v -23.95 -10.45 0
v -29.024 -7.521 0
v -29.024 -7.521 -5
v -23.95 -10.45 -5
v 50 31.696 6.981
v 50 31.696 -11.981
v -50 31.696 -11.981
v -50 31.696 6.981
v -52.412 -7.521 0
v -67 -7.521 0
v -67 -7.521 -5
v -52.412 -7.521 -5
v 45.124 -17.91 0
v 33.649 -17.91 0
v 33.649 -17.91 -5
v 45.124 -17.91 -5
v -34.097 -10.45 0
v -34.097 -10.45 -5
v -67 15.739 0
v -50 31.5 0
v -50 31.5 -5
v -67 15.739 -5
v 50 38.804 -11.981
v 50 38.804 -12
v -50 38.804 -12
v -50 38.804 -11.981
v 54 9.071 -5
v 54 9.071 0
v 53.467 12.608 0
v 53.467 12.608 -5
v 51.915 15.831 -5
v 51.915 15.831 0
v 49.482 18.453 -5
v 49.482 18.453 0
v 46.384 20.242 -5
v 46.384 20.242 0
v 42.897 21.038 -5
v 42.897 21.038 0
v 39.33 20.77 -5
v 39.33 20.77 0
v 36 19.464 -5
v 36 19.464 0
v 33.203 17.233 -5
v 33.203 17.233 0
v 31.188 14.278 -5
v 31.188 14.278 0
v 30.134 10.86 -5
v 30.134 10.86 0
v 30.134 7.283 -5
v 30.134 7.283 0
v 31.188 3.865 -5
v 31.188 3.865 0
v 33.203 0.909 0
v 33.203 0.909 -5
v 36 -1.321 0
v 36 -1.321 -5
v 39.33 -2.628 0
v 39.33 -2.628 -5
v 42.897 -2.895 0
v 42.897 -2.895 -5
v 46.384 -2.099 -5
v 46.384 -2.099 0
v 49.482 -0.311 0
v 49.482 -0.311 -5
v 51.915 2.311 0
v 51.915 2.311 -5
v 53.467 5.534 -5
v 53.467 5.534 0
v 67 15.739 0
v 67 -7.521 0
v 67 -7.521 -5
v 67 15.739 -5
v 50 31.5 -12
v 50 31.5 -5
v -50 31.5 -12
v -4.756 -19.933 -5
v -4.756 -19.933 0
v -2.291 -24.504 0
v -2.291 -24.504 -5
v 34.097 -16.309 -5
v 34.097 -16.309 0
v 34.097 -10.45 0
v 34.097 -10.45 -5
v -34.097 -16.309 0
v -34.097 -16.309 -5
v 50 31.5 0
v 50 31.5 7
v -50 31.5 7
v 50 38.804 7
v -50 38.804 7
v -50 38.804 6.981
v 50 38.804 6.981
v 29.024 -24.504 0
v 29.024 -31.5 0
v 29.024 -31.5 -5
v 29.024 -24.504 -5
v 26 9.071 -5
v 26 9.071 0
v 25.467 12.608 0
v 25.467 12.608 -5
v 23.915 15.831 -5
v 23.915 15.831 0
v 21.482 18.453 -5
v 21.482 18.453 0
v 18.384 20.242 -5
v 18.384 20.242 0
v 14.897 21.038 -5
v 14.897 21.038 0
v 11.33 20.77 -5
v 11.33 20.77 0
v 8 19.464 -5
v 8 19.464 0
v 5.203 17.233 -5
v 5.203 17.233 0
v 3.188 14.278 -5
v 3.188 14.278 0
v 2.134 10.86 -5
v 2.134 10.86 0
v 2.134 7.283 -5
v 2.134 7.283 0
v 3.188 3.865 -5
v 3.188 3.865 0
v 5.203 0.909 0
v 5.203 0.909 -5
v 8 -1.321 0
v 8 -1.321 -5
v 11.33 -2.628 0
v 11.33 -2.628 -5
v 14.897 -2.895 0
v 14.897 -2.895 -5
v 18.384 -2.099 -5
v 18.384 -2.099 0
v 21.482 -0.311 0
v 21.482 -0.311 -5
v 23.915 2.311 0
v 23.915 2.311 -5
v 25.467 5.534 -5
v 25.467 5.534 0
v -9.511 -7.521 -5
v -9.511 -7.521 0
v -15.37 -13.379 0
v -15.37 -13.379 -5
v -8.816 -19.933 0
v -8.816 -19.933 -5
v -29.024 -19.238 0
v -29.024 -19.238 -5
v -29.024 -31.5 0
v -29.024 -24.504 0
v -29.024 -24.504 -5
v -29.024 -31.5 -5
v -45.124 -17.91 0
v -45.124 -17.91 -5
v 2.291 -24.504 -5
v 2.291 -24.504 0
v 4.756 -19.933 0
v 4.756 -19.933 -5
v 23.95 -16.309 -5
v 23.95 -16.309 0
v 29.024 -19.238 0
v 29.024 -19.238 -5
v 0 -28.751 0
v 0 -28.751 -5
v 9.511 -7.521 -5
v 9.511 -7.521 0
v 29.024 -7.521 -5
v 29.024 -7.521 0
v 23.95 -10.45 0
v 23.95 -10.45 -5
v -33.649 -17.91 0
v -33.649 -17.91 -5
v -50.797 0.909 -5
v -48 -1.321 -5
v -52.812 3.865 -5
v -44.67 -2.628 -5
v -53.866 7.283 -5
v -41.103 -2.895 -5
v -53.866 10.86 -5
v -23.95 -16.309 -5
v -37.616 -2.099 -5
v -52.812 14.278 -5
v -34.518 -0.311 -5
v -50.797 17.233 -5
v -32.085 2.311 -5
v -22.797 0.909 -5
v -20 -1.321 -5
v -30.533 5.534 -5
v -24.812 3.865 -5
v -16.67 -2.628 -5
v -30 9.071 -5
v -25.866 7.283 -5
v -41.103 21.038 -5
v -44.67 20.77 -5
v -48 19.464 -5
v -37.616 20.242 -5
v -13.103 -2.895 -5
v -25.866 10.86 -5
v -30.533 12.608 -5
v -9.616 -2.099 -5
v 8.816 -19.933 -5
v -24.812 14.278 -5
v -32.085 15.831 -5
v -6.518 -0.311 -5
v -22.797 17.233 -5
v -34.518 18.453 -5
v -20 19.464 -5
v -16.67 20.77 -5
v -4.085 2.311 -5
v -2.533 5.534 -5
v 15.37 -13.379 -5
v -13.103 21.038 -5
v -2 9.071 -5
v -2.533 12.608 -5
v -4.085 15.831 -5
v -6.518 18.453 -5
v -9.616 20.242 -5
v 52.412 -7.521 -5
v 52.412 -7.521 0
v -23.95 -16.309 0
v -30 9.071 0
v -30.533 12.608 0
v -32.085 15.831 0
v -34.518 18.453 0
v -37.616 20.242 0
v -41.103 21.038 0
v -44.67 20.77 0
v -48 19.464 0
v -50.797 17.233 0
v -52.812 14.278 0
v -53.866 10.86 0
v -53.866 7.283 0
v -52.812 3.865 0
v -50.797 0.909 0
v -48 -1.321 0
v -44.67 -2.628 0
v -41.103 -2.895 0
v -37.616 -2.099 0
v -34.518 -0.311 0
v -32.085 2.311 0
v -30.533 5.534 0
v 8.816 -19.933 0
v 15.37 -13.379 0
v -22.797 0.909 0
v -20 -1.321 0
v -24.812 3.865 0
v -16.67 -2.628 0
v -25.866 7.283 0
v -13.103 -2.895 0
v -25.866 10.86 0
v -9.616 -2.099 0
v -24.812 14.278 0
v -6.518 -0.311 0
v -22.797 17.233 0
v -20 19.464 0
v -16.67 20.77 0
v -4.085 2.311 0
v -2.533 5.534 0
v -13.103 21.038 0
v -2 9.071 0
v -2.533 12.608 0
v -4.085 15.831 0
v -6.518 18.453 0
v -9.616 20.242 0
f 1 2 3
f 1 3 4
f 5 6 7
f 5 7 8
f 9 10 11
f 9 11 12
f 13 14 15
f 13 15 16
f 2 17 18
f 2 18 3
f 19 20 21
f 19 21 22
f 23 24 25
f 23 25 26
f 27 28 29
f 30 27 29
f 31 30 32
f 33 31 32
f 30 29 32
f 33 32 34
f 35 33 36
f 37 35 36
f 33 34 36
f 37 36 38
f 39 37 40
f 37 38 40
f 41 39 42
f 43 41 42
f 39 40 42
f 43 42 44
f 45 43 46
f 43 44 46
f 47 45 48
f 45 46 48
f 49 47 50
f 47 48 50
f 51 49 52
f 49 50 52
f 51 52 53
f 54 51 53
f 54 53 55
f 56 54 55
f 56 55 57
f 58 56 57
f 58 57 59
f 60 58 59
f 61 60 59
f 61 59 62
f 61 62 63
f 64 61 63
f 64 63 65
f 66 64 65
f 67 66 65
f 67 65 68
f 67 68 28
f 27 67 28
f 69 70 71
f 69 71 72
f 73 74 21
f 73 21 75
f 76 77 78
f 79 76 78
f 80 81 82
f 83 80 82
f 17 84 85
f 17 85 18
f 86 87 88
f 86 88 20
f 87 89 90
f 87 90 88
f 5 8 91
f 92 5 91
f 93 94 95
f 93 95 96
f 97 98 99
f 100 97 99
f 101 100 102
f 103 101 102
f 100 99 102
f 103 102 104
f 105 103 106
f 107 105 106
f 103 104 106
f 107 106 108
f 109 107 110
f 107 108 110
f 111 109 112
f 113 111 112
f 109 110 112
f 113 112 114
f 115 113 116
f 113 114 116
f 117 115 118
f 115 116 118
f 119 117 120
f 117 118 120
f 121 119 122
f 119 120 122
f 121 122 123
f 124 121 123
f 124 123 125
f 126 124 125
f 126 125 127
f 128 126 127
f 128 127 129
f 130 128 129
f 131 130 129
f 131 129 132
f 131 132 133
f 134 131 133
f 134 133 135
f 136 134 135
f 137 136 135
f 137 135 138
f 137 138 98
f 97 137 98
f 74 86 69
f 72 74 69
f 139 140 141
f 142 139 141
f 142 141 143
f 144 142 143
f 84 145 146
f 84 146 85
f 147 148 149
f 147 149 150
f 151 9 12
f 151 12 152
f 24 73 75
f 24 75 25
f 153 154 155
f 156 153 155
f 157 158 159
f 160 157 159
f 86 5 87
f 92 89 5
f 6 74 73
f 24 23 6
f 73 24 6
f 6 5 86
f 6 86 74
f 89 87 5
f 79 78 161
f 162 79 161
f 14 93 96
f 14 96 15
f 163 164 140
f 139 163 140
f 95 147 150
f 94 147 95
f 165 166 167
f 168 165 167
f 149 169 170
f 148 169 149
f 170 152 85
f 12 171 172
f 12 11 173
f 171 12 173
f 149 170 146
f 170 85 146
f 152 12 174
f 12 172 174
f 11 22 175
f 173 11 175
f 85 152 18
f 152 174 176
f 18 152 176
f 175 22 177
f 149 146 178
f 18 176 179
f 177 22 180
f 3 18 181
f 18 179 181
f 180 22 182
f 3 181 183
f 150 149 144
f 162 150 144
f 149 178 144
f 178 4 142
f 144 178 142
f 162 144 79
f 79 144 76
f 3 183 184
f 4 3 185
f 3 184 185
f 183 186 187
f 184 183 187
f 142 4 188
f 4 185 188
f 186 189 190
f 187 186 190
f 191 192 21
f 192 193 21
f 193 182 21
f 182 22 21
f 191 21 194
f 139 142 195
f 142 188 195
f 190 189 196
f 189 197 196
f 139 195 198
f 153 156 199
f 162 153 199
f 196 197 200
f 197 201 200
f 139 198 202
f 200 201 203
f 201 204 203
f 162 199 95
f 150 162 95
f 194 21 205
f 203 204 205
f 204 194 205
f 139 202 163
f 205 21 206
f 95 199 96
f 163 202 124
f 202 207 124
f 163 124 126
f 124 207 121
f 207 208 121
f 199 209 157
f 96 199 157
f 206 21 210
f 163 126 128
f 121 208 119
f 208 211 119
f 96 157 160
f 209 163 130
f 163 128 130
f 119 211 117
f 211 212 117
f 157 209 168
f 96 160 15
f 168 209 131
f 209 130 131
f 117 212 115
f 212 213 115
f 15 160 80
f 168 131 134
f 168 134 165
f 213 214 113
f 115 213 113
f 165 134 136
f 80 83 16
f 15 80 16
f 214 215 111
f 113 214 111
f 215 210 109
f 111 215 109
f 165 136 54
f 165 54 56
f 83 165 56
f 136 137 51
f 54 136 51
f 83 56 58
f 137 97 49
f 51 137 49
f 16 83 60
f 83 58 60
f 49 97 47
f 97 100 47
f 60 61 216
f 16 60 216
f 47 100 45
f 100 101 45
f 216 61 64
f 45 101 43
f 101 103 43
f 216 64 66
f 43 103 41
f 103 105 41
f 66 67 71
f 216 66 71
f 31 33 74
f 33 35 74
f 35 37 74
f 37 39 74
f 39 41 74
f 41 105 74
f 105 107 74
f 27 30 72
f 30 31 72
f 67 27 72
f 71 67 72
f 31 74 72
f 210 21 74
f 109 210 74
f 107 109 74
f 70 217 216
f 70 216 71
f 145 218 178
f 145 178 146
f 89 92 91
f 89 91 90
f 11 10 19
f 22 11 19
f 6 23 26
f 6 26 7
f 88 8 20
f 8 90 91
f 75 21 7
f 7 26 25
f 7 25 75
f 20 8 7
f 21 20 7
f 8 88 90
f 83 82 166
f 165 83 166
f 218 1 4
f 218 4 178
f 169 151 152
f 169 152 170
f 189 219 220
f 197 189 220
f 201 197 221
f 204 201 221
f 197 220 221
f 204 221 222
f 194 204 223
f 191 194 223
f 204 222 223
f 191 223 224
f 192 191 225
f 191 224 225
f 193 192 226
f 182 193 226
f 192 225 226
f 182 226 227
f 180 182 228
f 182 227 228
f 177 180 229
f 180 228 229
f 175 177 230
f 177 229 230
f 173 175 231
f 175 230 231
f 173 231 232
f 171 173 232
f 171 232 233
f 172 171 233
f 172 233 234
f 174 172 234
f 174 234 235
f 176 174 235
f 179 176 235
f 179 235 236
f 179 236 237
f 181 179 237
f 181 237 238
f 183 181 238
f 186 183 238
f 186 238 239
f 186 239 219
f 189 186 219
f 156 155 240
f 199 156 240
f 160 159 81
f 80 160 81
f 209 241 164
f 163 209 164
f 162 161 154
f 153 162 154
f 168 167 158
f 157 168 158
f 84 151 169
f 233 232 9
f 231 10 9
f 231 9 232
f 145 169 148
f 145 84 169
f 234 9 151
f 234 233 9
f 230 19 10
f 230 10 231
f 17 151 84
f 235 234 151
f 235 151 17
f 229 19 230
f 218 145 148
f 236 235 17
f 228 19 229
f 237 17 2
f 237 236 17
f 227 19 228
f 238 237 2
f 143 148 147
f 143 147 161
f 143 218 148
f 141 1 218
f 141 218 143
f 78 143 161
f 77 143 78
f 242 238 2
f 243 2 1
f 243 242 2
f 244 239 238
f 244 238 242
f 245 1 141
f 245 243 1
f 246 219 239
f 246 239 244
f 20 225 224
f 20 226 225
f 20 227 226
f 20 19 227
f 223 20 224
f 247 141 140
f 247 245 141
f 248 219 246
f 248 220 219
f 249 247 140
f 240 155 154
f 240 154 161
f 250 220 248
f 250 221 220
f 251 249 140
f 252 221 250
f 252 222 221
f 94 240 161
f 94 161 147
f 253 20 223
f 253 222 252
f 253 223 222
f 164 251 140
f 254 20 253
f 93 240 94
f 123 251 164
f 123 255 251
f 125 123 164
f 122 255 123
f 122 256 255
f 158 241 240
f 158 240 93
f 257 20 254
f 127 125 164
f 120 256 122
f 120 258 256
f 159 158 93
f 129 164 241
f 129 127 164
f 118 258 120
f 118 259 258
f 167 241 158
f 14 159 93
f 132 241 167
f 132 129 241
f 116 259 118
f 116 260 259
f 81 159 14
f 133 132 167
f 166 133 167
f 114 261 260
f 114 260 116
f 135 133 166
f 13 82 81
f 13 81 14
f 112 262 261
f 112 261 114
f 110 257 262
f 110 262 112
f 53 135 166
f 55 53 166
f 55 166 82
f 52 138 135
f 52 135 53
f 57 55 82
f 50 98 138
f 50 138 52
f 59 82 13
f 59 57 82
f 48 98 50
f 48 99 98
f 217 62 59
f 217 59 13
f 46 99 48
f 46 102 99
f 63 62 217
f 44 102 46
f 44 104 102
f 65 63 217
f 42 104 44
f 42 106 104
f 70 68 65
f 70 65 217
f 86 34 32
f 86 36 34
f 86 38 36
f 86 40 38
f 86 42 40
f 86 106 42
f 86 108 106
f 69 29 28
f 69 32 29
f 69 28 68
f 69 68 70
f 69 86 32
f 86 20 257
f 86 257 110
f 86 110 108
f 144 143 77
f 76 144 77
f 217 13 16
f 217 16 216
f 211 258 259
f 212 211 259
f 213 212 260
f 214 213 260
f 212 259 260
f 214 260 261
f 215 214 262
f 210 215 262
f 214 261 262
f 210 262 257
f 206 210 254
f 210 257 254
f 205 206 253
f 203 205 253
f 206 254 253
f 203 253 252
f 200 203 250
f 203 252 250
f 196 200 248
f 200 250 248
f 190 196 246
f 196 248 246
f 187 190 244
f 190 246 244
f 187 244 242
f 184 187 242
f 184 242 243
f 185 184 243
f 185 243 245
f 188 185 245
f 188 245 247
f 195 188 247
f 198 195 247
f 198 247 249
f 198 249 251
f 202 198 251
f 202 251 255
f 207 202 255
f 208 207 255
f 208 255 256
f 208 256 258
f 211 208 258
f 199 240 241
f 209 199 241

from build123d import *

# Parameters (mm, degrees)
SKETCH1_W           = 134
SKETCH1_H           = 63
BOSS_EXTRUDE1_DEPTH = 5
SKETCH3_R           = 12
CUT_EXTRUDE1_DEPTH  = 10
CUT_EXTRUDE2_DEPTH  = 10
BOSS_EXTRUDE2_DEPTH = 100


with BuildPart() as part:
    # Sketch1 → Boss-Extrude1 (new body)
    with BuildSketch(Plane.XY):
        Rectangle(SKETCH1_W, SKETCH1_H)
    extrude(amount=-BOSS_EXTRUDE1_DEPTH)

    # Sketch3 → Cut-Extrude1 (cut)
    with BuildSketch(Plane.XY):
        with Locations((-42, 9.071273883)):
            Circle(SKETCH3_R)
        with Locations((-14, 9.071273883)):
            Circle(SKETCH3_R)
        with Locations((14, 9.071273883)):
            Circle(SKETCH3_R)
        with Locations((42, 9.071273883)):
            Circle(SKETCH3_R)
    extrude(amount=-CUT_EXTRUDE1_DEPTH, mode=Mode.SUBTRACT)

    # Sketch4 → Cut-Extrude2 (cut)
    with BuildSketch(Plane.XY):
        Polygon((-67, -7.520628775), (-52.411804658, -7.520628775), (-45.12377265, -17.909951), (-33.648998849, -17.909951), (-29.023524966, -24.503711642), (-29.023524966, -31.5), (-67, -31.5), align=None)
        Polygon((67, -7.520628775), (67, -31.5), (29.023524966, -31.5), (29.023524966, -24.503711642), (33.648998849, -17.909951), (45.12377265, -17.909951), (52.411804658, -7.520628775), align=None)
        Polygon((-50, 31.5), (-67, 15.739047849), (-67, 31.5), align=None)
        Polygon((67, 15.739047849), (67, 31.5), (50, 31.5), align=None)
        Polygon((9.511401459, -7.520628775), (-9.511401459, -7.520628775), (-15.370004361, -13.379231677), (-8.815992906, -19.933243133), (-4.75570073, -19.933243133), (-2.290700849, -24.503711642), (0, -28.751004381), (2.290700849, -24.503711642), (4.75570073, -19.933243133), (8.815992906, -19.933243133), (15.370004361, -13.379231677), align=None)
        Polygon((-34.097223909, -10.449930226), (-29.023524966, -7.520628775), (-23.949826022, -10.449930226), (-23.949826022, -16.308533128), (-29.023524966, -19.237834579), (-34.097223909, -16.308533128), align=None)
        Polygon((29.023524966, -7.520628775), (23.949826022, -10.449930226), (23.949826022, -16.308533128), (29.023524966, -19.237834579), (34.097223909, -16.308533128), (34.097223909, -10.449930226), align=None)
    extrude(amount=-CUT_EXTRUDE2_DEPTH, mode=Mode.SUBTRACT)

    # Sketch5 → Boss-Extrude2 (add)
    with BuildSketch(Plane(origin=(50, 0, 0), x_dir=(0, 0, -1), z_dir=(1, 0, 0))):
        Polygon((5, 31.5), (12, 31.5), (12, 38.804238111), (11.980580676, 38.804238111), (11.980580676, 31.696116135), (5.980580676, 31.696116135), (-0.980580676, 31.696116135), (-6.980580676, 31.696116135), (-6.980580676, 38.804238111), (-7, 38.804238111), (-7, 31.5), (0, 31.5), align=None)
    extrude(amount=-BOSS_EXTRUDE2_DEPTH)


solid = part.part
